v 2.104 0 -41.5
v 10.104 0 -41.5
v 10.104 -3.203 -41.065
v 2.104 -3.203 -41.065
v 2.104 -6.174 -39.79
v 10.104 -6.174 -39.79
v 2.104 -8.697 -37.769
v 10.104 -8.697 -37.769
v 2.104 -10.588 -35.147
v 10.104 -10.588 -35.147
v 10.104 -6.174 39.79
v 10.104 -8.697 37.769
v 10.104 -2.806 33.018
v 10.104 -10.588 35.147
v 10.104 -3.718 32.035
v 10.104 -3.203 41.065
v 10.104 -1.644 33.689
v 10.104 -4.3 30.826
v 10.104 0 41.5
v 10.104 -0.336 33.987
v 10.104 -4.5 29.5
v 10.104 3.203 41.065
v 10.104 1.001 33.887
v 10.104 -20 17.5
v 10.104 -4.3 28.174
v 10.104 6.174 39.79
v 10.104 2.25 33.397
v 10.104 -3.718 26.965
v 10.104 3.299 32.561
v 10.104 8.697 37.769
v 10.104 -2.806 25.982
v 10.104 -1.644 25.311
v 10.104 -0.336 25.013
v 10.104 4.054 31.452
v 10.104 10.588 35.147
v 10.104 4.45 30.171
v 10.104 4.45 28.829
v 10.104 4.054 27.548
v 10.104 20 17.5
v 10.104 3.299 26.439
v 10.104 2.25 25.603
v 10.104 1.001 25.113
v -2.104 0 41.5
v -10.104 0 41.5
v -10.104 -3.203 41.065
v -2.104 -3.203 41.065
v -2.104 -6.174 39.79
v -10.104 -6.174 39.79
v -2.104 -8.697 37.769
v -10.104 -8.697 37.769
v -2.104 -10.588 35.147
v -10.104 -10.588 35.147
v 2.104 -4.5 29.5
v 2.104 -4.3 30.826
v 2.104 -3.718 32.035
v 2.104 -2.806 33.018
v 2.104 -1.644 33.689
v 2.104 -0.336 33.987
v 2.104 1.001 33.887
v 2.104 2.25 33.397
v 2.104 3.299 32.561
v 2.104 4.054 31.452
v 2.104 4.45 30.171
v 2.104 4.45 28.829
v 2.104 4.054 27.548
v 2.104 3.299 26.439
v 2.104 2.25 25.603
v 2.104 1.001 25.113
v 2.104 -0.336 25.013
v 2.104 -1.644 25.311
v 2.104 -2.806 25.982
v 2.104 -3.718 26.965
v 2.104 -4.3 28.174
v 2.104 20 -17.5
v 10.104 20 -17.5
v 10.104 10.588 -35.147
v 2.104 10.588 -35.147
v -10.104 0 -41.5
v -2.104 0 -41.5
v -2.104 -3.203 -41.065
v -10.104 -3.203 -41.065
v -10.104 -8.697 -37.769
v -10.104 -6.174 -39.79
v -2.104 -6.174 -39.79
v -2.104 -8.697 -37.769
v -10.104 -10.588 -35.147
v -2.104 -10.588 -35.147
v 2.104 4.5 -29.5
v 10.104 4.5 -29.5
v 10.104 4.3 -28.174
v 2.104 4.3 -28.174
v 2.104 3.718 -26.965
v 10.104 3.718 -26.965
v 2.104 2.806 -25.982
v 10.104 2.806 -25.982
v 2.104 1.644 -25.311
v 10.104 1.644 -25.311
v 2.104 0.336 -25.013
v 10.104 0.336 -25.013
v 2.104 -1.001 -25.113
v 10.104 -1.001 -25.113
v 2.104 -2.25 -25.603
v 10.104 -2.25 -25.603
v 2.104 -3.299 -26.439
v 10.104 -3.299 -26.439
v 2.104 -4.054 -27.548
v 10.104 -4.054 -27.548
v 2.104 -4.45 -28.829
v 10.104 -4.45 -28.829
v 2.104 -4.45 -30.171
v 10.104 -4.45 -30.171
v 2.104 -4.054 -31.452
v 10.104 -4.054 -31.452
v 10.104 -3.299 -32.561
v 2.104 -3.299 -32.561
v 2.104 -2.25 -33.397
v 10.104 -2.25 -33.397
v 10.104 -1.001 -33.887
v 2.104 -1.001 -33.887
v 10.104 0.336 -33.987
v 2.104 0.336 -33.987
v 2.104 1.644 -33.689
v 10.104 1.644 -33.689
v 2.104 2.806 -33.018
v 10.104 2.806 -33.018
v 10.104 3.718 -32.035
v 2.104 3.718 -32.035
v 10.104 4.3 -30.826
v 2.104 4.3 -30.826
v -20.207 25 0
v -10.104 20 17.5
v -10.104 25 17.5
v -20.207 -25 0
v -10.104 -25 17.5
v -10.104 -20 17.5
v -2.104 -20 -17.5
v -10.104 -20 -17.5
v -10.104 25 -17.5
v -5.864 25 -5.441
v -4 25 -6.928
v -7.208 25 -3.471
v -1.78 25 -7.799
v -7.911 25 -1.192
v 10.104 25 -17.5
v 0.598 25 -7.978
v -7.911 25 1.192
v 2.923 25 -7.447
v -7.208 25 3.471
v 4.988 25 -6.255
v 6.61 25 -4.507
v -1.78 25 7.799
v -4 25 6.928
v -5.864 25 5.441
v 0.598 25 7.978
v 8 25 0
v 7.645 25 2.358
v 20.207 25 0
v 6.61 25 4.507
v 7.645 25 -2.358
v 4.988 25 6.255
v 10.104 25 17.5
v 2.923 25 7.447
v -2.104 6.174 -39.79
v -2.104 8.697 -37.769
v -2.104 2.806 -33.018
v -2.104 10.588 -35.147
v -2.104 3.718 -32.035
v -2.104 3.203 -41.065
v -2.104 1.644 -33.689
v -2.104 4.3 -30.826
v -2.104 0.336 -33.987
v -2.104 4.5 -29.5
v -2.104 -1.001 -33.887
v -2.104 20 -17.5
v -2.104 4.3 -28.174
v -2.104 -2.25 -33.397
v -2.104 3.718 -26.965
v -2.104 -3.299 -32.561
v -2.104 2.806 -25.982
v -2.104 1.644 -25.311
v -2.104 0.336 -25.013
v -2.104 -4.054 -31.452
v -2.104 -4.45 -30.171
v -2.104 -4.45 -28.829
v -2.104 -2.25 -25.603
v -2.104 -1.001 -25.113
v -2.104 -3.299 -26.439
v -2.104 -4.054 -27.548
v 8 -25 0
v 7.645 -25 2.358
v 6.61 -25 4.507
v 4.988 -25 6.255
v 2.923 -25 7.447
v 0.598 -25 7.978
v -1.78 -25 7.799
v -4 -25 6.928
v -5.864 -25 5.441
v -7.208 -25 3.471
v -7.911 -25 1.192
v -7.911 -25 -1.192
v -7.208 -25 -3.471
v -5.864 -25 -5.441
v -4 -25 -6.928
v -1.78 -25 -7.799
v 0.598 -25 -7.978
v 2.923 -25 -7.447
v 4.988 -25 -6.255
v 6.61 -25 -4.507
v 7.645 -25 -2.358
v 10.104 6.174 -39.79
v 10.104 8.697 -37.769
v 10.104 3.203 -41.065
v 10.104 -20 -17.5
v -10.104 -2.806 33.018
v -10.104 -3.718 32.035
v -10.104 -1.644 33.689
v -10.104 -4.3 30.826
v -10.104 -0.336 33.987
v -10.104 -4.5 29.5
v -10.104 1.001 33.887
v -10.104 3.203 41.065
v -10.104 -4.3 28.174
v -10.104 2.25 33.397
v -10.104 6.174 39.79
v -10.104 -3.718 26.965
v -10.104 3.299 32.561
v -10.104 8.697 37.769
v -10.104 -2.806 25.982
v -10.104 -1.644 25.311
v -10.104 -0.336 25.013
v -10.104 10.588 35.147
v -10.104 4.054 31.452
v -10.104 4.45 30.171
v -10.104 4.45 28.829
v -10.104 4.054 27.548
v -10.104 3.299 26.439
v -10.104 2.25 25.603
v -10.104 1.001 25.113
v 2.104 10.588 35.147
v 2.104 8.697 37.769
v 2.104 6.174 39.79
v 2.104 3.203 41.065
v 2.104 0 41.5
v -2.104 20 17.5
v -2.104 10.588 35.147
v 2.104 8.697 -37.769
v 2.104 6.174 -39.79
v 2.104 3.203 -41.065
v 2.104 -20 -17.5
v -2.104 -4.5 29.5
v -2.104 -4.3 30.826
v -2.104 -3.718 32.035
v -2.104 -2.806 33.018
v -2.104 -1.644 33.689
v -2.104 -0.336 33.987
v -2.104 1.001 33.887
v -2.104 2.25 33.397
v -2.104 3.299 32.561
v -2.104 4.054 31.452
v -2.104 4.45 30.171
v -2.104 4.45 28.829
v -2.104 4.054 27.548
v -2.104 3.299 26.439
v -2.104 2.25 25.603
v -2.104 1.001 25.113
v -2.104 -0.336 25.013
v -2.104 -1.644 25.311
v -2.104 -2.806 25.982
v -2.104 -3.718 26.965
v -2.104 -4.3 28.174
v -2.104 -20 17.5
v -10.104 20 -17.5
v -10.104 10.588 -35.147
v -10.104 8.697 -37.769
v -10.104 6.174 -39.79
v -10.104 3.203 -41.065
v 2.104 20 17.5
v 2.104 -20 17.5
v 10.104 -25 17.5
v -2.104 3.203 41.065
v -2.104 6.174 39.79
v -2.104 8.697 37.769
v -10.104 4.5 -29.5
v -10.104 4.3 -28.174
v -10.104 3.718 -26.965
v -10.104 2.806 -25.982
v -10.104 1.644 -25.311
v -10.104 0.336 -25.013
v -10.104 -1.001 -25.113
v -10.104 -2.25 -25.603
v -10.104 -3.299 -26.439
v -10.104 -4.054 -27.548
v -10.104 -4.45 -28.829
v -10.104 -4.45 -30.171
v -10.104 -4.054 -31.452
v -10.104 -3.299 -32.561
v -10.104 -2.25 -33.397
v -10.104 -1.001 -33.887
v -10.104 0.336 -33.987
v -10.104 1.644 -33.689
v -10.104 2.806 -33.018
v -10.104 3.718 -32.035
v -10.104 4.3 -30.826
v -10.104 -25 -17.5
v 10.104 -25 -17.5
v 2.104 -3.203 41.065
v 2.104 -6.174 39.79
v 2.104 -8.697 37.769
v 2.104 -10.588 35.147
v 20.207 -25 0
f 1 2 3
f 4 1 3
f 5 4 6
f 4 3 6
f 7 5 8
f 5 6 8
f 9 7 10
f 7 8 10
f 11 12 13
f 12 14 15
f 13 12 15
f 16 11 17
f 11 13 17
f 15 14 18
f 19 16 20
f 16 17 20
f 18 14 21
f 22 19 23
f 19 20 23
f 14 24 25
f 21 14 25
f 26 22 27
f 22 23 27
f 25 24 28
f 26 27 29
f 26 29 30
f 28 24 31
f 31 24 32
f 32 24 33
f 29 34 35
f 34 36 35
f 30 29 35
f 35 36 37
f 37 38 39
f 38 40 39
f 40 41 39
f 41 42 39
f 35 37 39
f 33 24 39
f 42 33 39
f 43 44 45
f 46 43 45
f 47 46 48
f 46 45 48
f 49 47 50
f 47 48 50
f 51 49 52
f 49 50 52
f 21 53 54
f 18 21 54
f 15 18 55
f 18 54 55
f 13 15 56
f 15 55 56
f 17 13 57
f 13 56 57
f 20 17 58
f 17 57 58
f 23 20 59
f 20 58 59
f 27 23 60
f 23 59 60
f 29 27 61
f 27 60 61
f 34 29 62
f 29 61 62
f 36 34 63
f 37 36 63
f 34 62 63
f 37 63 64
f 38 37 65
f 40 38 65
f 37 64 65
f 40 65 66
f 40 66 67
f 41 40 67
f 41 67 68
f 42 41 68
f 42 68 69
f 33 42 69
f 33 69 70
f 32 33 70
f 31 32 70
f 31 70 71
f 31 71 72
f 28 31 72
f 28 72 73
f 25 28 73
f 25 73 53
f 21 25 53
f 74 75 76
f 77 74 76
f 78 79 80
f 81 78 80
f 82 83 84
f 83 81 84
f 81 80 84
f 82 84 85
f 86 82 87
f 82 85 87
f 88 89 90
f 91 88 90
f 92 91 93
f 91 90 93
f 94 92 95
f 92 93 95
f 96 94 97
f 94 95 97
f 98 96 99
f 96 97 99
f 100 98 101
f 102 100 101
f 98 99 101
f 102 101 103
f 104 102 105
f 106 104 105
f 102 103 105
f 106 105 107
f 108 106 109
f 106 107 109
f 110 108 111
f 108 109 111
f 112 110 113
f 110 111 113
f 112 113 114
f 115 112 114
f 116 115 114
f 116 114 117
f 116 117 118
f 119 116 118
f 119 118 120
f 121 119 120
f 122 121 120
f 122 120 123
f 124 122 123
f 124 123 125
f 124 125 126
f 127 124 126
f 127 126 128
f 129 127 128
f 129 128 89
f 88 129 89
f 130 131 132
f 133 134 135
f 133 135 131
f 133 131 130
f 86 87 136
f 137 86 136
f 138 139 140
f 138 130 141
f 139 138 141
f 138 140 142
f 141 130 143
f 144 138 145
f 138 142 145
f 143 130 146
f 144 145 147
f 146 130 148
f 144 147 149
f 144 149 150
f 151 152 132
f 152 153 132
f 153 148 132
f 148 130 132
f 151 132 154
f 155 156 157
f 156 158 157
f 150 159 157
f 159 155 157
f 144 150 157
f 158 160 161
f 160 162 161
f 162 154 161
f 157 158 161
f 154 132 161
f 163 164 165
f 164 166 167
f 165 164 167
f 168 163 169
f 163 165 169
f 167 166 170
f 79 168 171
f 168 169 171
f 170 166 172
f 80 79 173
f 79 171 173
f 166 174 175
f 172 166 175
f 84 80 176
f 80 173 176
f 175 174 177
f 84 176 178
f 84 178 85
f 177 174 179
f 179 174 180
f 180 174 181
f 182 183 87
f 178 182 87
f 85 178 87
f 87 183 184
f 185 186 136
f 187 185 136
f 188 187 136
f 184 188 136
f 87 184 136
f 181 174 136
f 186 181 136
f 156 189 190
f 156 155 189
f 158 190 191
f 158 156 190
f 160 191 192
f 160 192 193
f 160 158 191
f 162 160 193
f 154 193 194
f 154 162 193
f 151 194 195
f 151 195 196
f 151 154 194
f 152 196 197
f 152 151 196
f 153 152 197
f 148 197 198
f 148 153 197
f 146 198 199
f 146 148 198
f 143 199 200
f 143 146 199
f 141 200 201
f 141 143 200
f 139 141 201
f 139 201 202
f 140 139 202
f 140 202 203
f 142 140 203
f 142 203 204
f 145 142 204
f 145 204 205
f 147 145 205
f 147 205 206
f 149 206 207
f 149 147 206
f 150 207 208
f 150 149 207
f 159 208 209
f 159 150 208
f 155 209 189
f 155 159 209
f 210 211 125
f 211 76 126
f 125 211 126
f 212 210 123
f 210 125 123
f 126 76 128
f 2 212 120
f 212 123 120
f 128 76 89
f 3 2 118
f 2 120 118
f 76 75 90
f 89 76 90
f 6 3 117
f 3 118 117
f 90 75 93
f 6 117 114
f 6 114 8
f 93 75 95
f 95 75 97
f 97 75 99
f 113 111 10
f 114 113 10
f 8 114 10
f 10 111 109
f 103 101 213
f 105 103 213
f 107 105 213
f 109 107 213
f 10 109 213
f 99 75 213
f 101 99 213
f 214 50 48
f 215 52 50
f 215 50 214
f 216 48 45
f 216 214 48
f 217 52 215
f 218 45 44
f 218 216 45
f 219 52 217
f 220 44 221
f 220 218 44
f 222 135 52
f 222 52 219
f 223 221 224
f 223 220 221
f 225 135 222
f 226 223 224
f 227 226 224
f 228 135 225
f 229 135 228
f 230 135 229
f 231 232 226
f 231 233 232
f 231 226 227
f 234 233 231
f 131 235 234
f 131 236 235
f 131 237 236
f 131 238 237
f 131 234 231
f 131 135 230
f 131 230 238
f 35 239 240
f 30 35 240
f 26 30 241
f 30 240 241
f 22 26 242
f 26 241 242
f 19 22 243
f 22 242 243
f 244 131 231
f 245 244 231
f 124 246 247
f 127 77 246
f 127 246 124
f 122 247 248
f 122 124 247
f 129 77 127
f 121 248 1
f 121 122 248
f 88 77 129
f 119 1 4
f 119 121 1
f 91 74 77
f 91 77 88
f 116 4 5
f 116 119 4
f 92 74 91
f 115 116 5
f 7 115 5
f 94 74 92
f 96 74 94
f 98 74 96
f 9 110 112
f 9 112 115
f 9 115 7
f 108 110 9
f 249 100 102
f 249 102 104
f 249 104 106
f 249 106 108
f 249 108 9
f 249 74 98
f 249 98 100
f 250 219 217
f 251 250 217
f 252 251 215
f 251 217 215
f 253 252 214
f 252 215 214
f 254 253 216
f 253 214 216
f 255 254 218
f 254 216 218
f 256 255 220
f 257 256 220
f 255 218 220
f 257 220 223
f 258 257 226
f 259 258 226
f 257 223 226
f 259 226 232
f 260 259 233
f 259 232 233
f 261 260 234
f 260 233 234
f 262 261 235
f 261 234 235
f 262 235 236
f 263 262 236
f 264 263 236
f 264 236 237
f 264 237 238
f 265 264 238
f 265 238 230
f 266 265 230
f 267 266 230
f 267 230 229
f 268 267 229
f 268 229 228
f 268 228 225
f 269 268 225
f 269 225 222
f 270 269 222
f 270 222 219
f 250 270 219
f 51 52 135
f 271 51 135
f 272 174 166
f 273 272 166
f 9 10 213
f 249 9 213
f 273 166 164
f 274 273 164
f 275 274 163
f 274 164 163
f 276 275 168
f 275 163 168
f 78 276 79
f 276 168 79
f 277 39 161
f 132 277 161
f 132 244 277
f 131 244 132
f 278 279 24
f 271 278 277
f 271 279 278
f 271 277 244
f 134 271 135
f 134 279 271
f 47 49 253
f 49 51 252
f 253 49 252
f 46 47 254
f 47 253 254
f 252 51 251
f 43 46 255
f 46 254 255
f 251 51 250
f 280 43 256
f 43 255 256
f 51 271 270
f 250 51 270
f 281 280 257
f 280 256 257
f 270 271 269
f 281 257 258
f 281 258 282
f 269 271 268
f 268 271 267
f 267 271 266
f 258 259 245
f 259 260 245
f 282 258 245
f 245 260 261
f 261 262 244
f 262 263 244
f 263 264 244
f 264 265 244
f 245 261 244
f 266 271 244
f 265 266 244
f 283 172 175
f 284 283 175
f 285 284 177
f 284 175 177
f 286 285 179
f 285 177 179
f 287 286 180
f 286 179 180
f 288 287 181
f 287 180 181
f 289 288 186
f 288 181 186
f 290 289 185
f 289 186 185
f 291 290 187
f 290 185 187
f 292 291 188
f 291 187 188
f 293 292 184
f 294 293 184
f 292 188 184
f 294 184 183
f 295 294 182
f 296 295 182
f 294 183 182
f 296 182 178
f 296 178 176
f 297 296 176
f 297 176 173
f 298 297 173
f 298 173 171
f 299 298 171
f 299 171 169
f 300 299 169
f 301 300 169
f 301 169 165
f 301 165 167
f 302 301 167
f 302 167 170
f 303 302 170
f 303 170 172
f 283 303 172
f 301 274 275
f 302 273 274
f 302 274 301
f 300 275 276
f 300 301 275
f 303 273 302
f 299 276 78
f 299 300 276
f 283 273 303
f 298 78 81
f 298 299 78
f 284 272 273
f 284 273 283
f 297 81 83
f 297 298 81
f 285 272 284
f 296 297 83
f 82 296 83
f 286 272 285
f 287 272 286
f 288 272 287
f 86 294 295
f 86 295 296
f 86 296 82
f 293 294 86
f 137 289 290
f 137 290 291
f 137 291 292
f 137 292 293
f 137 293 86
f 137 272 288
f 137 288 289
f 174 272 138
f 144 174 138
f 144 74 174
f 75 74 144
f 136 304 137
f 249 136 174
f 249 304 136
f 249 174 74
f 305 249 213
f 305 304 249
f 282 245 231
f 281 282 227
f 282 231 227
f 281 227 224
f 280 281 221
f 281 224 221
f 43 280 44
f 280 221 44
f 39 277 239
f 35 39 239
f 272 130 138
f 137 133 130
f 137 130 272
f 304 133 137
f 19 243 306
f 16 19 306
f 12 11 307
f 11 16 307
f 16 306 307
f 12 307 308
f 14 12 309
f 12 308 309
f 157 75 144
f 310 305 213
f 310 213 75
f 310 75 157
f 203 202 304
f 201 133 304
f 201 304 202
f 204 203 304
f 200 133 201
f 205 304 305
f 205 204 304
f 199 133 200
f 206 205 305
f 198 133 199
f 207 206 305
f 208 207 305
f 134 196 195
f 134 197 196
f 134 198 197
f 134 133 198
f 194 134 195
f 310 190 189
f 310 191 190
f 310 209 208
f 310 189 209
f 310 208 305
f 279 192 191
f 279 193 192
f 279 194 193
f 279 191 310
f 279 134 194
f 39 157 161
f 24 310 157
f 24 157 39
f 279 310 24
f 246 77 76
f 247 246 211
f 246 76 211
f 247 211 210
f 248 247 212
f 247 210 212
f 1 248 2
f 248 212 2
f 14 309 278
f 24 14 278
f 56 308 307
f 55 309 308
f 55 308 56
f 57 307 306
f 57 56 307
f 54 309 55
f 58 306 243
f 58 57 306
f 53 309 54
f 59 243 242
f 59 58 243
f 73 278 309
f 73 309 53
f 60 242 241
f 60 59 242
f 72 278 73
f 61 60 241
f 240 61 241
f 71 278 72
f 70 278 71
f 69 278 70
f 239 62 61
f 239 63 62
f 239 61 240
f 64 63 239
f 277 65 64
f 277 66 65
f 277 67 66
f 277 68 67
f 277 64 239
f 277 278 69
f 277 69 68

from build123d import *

# Parameters (mm, degrees)
F0_R      = 8
F1_DEPTH  = 25
F2_W      = 20.2072594216
F2_H      = 40
F3_DEPTH  = 24
F4_R      = 4.5
F5_DEPTH  = 30.3118891325
F7_DEPTH  = 25.4
F8_W      = 4.2072594216
F8_H      = 50
F9_DEPTH  = 25.4
F10_W     = 20.2072594216
F10_H     = 40
F11_DEPTH = 24
F12_R     = 4.5
F13_DEPTH = 25.4
F15_DEPTH = 25.4
F16_W     = 4.2072594216
F16_H     = 50
F17_DEPTH = 25.4


with BuildPart() as f1:
    # F0 (on Front) → F1 (new body, symmetric)
    with BuildSketch(Plane.XZ):
        Polygon((10.1036297108, 17.5), (-10.1036297108, 17.5), (-20.2072594216, 0), (-10.1036297108, -17.5), (10.1036297108, -17.5), (20.2072594216, 0), align=None)
        Circle(F0_R, mode=Mode.SUBTRACT)
    extrude(amount=F1_DEPTH, both=True)

    # F2 (on face) → F3 (join)
    with BuildSketch(Plane.XY.offset(17.5)):
        Rectangle(F2_W, F2_H)
    extrude(amount=F3_DEPTH)

    # F4 (on face) → F5 (cut, through all)
    with BuildSketch(Plane(origin=(-10.1036297108, 0, 0), x_dir=(0, -1, 0), z_dir=(-1, 0, 0))):
        with Locations((0, 29.5)):
            Circle(F4_R)
    extrude(amount=-F5_DEPTH, mode=Mode.SUBTRACT)

    # F6 (on face) → F7 (cut)
    with BuildSketch(Plane(origin=(-10.1036297108, 0, 0), x_dir=(0, -1, 0), z_dir=(-1, 0, 0))):
        with BuildLine():
            Line((-20, 41.5), (-20, 17.5))
            Line((-20, 17.5), (-10.5882352941, 35.1470588235))
            ThreePointArc((-10.5882352941, 35.1470588235), (-6.1739490436, 39.7899151215), (5.03e-08, 41.5))
            Line((5.03e-08, 41.5), (-20, 41.5))
        make_face()
        with BuildLine():
            Line((10.5882352941, 35.1470588235), (20, 17.5))
            Line((20, 17.5), (20, 41.5))
            Line((20, 41.5), (5.03e-08, 41.5))
            ThreePointArc((5.03e-08, 41.5), (6.1739490867, 39.7899150956), (10.5882352941, 35.1470588235))
        make_face()
    extrude(amount=-F7_DEPTH, mode=Mode.SUBTRACT)

    # F8 (on face) → F9 (cut)
    with BuildSketch(Plane.XY.offset(17.5)):
        Rectangle(F8_W, F8_H)
    extrude(amount=F9_DEPTH, mode=Mode.SUBTRACT)

    # F10 (on face) → F11 (join)
    with BuildSketch(Plane(origin=(0, 0, -17.5), x_dir=(1, 0, 0), z_dir=(0, 0, -1))):
        Rectangle(F10_W, F10_H)
    extrude(amount=F11_DEPTH)

    # F12 (on face) → F13 (cut)
    with BuildSketch(Plane.YZ.offset(10.1036297108)):
        with Locations((0, -29.5)):
            Circle(F12_R)
    extrude(amount=-F13_DEPTH, mode=Mode.SUBTRACT)

    # F14 (on face) → F15 (cut)
    with BuildSketch(Plane.YZ.offset(10.1036297108)):
        with BuildLine():
            Line((20, -41.5), (20, -17.5))
            Line((20, -17.5), (10.5882352941, -35.1470588235))
            ThreePointArc((10.5882352941, -35.1470588235), (6.1739490436, -39.7899151215), (-5.03e-08, -41.5))
            Line((-5.03e-08, -41.5), (20, -41.5))
        make_face()
        with BuildLine():
            Line((-10.5882352941, -35.1470588235), (-20, -17.5))
            Line((-20, -17.5), (-20, -41.5))
            Line((-20, -41.5), (-5.03e-08, -41.5))
            ThreePointArc((-5.03e-08, -41.5), (-6.1739490867, -39.7899150956), (-10.5882352941, -35.1470588235))
        make_face()
    extrude(amount=-F15_DEPTH, mode=Mode.SUBTRACT)

    # F16 (on face) → F17 (cut)
    with BuildSketch(Plane(origin=(0, 0, -17.5), x_dir=(1, 0, 0), z_dir=(0, 0, -1))):
        Rectangle(F16_W, F16_H)
    extrude(amount=F17_DEPTH, mode=Mode.SUBTRACT)


solid = f1.part
